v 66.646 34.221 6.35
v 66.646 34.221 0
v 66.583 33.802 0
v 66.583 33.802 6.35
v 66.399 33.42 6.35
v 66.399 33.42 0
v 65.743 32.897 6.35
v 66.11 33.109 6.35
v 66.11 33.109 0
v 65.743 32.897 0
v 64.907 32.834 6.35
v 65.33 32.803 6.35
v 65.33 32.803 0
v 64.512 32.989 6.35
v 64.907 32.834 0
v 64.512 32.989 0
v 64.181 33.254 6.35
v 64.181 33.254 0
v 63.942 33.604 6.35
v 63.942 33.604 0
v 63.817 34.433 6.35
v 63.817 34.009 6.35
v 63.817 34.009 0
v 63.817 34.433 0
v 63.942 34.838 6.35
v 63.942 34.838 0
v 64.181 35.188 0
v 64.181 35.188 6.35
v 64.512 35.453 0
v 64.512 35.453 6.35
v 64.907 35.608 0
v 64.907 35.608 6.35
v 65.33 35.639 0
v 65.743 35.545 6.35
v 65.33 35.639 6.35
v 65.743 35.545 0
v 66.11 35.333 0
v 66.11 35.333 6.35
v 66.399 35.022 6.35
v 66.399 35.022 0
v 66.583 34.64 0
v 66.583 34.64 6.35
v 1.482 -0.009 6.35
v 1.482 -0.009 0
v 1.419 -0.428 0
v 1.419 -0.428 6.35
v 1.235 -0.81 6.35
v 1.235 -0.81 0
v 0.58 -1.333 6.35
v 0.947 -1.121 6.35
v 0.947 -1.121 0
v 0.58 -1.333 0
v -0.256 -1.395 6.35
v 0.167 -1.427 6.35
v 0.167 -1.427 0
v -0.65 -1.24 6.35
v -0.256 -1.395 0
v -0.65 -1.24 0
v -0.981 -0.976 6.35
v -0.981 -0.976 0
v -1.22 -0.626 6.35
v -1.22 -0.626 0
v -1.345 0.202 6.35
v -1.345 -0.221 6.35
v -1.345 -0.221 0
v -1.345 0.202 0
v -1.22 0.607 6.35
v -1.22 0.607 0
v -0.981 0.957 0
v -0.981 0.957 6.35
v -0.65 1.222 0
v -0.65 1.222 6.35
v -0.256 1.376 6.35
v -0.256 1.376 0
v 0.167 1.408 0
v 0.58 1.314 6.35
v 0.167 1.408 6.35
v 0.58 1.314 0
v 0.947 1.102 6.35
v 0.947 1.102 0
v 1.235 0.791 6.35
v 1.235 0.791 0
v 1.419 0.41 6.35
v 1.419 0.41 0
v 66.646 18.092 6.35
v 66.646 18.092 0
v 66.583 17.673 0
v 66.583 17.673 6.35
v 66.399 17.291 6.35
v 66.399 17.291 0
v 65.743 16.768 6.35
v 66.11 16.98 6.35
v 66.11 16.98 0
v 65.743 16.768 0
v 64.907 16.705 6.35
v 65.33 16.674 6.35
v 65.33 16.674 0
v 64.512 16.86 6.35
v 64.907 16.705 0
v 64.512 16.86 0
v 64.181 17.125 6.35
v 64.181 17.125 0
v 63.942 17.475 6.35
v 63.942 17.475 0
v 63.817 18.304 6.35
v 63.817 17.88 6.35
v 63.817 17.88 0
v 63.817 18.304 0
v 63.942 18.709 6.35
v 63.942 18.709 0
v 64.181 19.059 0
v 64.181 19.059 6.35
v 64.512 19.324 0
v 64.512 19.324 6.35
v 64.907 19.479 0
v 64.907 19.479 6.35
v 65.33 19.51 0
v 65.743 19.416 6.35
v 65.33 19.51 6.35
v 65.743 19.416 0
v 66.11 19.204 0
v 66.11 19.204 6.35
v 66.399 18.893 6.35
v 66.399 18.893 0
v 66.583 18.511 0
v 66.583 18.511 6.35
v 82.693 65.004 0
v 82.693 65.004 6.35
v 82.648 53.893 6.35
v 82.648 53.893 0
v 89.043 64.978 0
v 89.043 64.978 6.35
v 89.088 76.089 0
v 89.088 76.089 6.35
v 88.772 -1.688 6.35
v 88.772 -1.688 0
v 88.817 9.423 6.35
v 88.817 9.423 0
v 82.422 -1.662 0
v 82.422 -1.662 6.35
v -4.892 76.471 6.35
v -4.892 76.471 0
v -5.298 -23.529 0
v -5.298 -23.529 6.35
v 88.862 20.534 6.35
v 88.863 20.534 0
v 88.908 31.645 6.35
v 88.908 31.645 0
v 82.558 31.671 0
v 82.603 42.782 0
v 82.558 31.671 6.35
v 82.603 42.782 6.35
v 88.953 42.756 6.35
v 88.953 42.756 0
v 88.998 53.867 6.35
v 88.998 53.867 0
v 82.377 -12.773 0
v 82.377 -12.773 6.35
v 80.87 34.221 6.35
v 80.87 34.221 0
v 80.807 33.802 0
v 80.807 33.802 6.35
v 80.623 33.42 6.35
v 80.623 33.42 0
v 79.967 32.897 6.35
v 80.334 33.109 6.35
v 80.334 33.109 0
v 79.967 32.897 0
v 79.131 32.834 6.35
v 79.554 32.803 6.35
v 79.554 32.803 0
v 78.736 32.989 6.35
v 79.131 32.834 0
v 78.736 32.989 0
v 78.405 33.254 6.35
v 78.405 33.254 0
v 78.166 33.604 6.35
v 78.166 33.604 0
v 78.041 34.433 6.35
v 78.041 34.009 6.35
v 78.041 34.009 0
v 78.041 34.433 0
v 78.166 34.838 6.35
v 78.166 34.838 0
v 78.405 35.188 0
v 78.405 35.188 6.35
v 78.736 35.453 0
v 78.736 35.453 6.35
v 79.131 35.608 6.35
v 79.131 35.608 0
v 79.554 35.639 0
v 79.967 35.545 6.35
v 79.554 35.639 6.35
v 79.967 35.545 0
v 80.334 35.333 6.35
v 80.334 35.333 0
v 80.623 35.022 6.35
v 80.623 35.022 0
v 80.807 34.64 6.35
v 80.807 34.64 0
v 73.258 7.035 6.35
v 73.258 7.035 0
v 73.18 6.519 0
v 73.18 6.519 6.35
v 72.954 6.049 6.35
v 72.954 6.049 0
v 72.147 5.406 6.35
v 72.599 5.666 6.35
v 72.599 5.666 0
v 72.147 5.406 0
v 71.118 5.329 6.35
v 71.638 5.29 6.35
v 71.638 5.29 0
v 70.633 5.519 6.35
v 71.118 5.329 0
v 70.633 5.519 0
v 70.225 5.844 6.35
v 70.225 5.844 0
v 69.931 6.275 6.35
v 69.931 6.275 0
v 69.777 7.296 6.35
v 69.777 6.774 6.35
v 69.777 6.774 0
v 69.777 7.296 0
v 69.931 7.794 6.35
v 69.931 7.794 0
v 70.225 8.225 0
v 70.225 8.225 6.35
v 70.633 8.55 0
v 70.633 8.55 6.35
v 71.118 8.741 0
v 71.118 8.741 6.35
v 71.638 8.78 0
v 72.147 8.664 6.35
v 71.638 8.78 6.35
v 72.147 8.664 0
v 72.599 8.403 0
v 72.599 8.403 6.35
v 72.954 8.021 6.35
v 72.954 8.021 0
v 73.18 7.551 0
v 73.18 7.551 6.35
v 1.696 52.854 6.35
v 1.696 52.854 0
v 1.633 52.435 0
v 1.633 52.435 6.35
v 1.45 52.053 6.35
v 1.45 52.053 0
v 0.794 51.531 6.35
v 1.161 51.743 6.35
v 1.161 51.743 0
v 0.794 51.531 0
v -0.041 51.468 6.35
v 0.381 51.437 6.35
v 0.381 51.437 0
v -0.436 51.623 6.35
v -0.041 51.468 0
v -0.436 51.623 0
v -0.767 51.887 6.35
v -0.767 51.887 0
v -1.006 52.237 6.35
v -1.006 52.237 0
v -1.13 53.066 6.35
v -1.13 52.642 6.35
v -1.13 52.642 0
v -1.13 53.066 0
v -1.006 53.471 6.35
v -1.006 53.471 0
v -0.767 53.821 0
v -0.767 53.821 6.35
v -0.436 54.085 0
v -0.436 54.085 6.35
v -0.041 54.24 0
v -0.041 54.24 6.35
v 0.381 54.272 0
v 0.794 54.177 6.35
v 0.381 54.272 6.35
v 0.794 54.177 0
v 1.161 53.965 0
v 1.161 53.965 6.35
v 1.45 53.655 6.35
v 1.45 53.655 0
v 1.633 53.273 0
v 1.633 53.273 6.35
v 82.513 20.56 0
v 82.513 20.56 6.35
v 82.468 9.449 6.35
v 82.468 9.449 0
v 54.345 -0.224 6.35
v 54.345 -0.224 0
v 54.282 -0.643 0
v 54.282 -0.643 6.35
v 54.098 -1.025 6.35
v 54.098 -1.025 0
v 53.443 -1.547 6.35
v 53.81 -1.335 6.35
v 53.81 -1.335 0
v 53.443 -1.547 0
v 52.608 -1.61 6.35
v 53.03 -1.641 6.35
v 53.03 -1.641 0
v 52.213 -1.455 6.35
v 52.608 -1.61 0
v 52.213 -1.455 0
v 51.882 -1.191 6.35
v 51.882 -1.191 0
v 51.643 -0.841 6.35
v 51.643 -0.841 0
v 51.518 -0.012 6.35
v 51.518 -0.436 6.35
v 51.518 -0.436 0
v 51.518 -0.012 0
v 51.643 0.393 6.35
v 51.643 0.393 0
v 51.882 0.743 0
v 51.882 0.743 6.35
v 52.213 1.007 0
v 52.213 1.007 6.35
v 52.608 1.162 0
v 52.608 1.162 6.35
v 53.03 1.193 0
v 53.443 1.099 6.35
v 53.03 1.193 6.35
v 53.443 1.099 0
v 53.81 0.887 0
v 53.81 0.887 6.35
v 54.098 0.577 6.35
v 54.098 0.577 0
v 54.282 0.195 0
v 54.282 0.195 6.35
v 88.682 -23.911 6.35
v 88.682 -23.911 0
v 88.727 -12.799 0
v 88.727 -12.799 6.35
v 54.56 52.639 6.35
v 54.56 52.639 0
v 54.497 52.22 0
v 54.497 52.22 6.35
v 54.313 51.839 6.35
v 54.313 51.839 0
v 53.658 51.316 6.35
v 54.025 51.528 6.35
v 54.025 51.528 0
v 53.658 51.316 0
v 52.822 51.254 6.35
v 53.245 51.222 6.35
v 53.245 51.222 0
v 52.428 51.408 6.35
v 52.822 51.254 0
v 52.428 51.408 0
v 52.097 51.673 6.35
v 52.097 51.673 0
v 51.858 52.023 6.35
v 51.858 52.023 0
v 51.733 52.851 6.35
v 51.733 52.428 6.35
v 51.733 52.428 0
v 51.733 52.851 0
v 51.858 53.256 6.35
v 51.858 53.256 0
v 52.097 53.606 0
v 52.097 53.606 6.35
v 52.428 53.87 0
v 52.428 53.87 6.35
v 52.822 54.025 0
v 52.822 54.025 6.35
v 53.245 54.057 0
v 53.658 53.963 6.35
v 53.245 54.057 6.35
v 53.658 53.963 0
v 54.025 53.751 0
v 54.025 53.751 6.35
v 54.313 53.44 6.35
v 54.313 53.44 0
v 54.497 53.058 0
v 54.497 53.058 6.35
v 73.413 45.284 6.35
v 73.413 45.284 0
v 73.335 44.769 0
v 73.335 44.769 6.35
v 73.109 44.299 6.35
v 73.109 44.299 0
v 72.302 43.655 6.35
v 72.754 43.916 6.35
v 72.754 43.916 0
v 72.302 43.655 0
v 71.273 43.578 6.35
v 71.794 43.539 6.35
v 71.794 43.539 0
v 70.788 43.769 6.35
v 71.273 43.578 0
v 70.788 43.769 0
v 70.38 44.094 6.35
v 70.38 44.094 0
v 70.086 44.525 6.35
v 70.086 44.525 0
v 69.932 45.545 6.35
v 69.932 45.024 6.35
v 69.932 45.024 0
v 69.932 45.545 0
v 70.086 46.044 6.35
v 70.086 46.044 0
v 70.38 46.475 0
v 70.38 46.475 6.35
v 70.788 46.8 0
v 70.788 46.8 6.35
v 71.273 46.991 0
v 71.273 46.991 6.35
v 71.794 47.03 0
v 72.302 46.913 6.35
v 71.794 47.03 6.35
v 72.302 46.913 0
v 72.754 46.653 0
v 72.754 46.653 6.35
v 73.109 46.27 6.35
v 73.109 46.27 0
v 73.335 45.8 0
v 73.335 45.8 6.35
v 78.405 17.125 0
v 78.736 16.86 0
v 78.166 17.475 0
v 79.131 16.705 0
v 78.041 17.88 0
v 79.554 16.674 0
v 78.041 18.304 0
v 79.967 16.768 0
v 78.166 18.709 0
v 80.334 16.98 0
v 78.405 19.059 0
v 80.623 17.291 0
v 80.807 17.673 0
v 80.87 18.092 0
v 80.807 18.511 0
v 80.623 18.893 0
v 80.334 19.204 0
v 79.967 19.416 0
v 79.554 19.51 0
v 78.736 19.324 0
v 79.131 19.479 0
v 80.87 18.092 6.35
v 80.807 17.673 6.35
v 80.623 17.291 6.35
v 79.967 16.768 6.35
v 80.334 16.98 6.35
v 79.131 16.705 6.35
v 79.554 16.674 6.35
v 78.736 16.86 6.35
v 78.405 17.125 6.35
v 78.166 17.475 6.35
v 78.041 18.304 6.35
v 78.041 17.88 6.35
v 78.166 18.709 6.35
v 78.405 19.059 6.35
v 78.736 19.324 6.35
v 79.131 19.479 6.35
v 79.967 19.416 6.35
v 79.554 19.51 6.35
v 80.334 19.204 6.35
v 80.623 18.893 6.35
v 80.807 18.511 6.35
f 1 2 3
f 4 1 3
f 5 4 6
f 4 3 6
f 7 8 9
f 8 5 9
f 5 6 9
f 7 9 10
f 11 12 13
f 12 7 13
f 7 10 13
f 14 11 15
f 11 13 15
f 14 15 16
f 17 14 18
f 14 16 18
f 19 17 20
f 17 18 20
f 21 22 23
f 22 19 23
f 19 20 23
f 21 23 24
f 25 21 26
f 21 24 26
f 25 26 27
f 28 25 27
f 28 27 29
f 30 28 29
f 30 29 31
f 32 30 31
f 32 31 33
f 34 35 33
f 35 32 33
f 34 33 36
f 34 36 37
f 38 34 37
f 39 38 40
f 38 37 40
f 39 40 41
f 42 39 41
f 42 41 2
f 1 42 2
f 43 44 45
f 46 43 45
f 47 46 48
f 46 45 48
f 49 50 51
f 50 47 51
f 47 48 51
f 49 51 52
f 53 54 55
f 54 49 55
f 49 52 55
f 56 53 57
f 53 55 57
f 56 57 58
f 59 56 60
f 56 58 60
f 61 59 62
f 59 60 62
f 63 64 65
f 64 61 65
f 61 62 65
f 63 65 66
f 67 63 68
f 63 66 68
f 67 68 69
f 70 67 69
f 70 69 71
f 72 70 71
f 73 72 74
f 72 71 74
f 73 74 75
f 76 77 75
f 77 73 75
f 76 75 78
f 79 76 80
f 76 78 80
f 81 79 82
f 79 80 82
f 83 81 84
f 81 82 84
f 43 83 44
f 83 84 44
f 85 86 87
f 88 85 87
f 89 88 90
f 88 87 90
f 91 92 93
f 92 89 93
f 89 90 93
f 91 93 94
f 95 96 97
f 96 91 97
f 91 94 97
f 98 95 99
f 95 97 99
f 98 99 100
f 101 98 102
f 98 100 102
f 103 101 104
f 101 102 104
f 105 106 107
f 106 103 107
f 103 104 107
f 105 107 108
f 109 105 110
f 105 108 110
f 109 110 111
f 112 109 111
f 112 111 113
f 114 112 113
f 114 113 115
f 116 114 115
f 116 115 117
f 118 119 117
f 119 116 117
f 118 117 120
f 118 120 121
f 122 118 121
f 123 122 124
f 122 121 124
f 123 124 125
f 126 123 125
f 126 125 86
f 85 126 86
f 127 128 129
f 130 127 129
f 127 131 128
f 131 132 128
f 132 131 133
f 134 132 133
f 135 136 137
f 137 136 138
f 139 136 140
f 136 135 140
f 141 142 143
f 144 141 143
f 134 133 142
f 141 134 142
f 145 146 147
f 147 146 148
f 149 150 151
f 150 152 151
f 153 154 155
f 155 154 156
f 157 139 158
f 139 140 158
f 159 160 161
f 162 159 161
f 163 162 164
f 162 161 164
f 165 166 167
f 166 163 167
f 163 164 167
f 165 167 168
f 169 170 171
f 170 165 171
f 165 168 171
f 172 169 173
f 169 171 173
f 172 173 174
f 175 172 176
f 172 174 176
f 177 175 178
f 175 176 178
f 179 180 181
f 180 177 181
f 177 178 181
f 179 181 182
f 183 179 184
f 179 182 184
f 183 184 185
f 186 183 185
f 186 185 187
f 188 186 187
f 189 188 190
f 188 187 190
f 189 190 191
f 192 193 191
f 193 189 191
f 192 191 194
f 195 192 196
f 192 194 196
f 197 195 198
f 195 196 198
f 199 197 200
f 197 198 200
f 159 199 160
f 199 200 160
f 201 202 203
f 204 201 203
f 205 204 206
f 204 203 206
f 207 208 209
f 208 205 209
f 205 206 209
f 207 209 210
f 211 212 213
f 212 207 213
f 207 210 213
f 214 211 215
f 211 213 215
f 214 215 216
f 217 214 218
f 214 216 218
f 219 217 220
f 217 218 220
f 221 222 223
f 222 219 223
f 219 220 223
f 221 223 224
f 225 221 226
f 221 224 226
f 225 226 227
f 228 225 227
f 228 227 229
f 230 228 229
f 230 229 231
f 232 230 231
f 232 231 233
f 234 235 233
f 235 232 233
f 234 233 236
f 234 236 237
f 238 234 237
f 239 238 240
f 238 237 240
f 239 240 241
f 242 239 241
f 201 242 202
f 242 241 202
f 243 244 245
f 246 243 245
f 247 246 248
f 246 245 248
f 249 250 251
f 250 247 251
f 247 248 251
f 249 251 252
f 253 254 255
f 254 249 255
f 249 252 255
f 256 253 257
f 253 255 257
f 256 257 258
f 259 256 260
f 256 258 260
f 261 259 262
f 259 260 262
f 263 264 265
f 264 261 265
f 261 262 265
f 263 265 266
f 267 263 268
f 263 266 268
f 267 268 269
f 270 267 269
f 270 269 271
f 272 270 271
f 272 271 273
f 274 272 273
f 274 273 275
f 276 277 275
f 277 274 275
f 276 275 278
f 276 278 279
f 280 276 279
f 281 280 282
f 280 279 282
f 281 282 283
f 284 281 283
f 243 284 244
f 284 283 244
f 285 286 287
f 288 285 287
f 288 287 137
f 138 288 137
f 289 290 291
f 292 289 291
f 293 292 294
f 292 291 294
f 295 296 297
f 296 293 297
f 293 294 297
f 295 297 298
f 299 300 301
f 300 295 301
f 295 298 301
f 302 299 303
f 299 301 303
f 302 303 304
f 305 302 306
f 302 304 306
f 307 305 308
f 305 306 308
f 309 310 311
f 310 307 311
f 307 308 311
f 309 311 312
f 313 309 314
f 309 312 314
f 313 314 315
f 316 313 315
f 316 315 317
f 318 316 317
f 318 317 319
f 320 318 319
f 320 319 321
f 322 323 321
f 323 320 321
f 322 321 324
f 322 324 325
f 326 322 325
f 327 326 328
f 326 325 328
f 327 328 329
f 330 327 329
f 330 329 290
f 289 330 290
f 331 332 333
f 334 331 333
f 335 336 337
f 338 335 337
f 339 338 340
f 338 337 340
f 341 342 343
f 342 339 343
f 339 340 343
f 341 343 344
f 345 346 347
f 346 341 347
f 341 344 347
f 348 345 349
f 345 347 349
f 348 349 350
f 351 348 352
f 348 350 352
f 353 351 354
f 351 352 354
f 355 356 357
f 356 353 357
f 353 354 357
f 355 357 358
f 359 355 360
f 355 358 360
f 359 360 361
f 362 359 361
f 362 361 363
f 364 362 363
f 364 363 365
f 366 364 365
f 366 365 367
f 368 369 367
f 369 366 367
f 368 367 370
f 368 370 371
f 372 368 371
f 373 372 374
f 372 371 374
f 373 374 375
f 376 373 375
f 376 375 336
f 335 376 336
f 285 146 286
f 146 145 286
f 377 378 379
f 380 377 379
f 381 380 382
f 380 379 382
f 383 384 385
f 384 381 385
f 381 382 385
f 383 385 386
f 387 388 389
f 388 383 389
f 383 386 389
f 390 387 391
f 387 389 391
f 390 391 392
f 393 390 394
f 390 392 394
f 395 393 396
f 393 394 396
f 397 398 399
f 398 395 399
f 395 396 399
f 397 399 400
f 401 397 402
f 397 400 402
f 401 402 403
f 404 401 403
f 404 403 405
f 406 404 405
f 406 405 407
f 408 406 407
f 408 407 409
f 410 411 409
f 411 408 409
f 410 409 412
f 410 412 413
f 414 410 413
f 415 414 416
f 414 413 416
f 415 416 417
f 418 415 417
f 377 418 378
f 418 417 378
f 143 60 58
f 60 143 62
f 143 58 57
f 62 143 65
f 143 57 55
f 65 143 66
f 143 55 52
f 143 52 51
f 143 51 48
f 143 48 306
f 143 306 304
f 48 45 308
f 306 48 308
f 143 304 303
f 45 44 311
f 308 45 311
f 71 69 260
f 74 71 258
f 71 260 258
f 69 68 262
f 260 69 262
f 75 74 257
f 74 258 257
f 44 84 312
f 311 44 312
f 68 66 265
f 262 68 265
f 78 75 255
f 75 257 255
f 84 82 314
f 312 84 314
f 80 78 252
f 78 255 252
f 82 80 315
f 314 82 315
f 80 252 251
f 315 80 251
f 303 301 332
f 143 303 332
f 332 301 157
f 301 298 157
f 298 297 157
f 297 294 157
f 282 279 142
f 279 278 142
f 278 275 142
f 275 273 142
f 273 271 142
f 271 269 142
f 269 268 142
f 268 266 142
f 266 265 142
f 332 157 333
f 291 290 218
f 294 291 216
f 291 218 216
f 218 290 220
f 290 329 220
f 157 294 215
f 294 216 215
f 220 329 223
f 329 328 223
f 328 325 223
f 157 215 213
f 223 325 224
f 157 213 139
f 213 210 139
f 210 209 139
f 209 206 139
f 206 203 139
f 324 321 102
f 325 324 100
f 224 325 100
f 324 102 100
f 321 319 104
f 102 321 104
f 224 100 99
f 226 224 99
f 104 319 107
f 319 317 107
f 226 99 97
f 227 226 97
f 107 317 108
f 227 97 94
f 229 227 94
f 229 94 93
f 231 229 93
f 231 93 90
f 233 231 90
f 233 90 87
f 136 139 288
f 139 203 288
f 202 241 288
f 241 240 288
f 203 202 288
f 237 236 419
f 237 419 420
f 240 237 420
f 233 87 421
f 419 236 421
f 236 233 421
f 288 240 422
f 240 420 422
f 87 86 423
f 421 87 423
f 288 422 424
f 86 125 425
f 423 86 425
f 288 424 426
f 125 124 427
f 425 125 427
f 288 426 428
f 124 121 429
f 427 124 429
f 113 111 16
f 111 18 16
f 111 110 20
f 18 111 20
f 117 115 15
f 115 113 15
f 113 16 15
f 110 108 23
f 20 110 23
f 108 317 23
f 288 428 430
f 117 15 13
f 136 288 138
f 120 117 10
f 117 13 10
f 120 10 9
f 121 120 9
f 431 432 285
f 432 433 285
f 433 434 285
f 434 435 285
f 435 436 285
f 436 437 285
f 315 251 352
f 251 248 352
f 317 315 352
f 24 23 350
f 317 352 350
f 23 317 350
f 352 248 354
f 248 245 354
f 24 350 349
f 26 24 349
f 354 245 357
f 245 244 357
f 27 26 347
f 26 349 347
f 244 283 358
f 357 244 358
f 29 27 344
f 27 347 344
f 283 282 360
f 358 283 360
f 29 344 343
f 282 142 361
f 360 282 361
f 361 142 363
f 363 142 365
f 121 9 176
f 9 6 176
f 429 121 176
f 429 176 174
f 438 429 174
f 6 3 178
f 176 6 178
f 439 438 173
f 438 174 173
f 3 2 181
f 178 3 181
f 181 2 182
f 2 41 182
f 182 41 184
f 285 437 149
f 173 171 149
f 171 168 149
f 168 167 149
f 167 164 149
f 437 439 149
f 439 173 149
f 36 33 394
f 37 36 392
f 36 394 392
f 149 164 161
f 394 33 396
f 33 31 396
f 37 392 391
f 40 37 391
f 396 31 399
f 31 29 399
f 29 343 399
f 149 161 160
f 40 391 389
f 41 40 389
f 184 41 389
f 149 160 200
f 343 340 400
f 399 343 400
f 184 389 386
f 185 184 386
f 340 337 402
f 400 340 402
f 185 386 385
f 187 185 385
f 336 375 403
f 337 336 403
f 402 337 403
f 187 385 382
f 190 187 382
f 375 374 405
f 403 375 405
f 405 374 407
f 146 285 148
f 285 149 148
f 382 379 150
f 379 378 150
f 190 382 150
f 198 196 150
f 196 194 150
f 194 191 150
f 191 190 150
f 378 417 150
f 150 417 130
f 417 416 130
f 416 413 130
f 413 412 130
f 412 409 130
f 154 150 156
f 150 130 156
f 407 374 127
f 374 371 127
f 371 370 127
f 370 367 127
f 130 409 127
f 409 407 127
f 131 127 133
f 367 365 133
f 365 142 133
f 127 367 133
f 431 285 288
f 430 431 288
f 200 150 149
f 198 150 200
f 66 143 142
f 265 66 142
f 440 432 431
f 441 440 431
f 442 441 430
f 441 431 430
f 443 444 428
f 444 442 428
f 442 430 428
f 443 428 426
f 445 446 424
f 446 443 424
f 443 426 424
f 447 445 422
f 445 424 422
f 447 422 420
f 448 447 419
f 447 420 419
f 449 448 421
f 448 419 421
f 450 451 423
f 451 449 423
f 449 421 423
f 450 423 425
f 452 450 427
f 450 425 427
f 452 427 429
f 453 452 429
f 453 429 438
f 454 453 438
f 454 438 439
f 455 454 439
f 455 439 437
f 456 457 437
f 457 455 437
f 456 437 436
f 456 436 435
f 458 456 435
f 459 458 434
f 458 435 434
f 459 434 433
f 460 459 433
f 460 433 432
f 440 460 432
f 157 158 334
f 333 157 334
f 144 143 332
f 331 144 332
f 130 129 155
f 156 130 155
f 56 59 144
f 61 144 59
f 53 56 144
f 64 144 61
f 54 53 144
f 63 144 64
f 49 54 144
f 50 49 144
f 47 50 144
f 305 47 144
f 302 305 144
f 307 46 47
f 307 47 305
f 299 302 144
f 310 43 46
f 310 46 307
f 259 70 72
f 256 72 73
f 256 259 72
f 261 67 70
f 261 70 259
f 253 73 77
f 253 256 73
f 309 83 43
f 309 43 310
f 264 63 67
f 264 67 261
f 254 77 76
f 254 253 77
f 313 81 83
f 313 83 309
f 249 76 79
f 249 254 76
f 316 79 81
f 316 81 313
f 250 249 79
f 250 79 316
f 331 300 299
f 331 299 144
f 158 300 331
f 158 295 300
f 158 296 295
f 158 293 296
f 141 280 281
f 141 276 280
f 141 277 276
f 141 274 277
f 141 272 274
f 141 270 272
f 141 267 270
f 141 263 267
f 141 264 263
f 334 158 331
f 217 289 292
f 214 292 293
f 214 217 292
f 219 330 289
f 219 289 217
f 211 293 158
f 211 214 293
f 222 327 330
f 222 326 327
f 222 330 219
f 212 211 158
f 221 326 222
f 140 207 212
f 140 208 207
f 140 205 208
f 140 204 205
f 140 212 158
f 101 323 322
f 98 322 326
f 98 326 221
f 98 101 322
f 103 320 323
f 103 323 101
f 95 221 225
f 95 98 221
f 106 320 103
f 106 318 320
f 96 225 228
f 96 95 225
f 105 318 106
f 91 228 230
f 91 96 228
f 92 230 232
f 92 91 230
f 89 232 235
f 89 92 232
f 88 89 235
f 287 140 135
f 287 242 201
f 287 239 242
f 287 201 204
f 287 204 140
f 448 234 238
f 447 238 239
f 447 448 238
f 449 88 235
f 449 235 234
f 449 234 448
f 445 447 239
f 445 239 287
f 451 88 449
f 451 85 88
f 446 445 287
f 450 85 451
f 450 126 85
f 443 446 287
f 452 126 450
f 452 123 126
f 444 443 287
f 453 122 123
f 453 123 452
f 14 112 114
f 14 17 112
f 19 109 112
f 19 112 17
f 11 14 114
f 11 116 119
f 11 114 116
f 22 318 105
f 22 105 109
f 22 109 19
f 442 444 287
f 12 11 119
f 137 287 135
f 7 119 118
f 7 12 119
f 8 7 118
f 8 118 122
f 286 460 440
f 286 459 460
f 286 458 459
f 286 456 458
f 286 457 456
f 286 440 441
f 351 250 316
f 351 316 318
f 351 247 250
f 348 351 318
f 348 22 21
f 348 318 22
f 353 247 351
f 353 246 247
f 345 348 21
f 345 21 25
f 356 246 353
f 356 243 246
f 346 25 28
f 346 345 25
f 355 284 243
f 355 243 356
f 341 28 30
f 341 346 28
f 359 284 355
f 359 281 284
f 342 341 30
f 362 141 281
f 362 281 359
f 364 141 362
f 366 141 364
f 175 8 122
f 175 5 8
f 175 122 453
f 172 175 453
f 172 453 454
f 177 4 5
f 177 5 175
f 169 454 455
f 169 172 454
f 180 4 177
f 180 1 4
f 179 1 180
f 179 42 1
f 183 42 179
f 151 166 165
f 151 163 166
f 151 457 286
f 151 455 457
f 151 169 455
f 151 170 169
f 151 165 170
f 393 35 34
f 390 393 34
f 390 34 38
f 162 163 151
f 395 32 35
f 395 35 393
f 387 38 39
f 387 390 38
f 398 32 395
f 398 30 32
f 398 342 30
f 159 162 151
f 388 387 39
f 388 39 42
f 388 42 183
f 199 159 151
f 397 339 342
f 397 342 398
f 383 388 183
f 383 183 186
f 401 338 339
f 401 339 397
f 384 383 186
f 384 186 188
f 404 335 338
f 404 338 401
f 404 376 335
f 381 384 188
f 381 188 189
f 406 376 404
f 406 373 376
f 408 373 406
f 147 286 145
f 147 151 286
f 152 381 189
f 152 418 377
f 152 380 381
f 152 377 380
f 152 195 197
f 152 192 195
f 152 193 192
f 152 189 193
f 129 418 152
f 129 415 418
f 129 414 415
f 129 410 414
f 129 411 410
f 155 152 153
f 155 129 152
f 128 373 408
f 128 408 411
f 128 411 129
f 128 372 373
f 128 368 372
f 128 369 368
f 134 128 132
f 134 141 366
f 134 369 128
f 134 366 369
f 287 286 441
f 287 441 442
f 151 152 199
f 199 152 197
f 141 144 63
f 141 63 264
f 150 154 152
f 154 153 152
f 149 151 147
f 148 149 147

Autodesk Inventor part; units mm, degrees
ref_plane "YZ Plane" through (0, 0, 0) normal (1, 0, 0) x (0, 1, 0)
ref_plane "XZ Plane" through (0, 0, 0) normal (0, 1, 0) x (-1, 0, 0)
ref_plane "XY Plane" through (0, 0, 0) normal (0, 0, 1) x (1, 0, 0)
sketch "Sketch1" plane through (0, 0, 0) normal (0, 0, 1) x (1, 0, 0)
  circle A0 centre (0.2751, 52.8541) radius 1.4214
  circle A1 centre (53.1386, 52.6394) radius 1.4214
  circle A2 centre (52.924, -0.224) radius 1.4214
  circle A3 centre (0.0605, -0.0094) radius 1.4214
  circle A4 centre (0.2751, 52.8541) radius 1.4214
  circle A5 centre (0.0605, -0.0094) radius 1.4214
  circle A6 centre (52.924, -0.224) radius 1.4214
  circle A7 centre (53.1386, 52.6394) radius 1.4214
  line L0 (-5.2979, -23.5291) -> (88.6821, -23.9107)
  line L1 (88.6821, -23.9107) -> (89.0881, 76.0893)
  line L2 (89.0881, 76.0893) -> (-4.8919, 76.4709)
  line L3 (-4.8919, 76.4709) -> (-5.2979, -23.5291)
  line L4 (-5.2979, -23.5291) -> (2.9514, -23.54) construction
  circle A8 centre (26.5572, 26.3424) radius 11 construction
  circle A9 centre (41.9941, 10.7796) radius 1.5 construction
  circle A10 centre (10.9944, 10.9055) radius 1.5 construction
  circle A11 centre (11.1202, 41.9052) radius 1.5 construction
  circle A12 centre (42.12, 41.7793) radius 1.5 construction
  circle A13 centre (0.2148, 52.8996) radius 1.4224 construction
  circle A14 centre (0, 0) radius 1.4224 construction
  circle A15 centre (52.8996, -0.2148) radius 1.4224 construction
  circle A16 centre (53.1143, 52.6848) radius 1.4224 construction
  line L5 (-5.3215, -5.2784) -> (58.178, -5.5363) construction
  line L6 (58.178, -5.5363) -> (58.4358, 57.9632) construction
  line L7 (58.4358, 57.9632) -> (-5.0637, 58.221) construction
  line L8 (-5.0637, 58.221) -> (-5.3215, -5.2784) construction
  line L9 (88.8851, 26.0893) -> (-5.1926, 26.4713) construction
  line L10 (63.369, -2.4573) -> (63.4464, 16.5925) construction
  line L11 (63.5243, 35.7924) -> (63.6017, 54.8422) construction
  line L12 (63.5243, 35.7924) -> (82.5742, 35.715) construction
  line L13 (63.369, -2.4573) -> (82.4189, -2.5346) construction
  circle A17 centre (71.5076, 7.0347) radius 1.75
  circle A18 centre (71.6629, 45.2844) radius 1.75
  circle A19 centre (71.6629, 45.2844) radius 1.75 construction
  circle A20 centre (71.5076, 7.0347) radius 1.75 construction
  circle A21 centre (72.3353, 26.1565) radius 2.5 construction
  line L14 (65.2233, 18.092) -> (79.4473, 18.092) construction
  line L15 (79.4473, 18.092) -> (79.4473, 34.221) construction
  line L16 (79.4473, 34.221) -> (65.2233, 34.221) construction
  line L17 (65.2233, 34.221) -> (65.2233, 18.092) construction
  line L18 (65.2233, 18.092) -> (79.4473, 34.221) construction
  line L19 (79.4473, 18.092) -> (65.2233, 34.221) construction
  circle A22 centre (79.4473, 18.092) radius 1.4224
  circle A23 centre (65.2233, 18.092) radius 1.4224
  circle A24 centre (79.4473, 34.221) radius 1.4224
  circle A25 centre (65.2233, 34.221) radius 1.4224
  circle A26 centre (79.4473, 18.092) radius 2.6035 construction
  circle A27 centre (65.2233, 18.092) radius 2.6035 construction
  circle A28 centre (79.4473, 34.221) radius 2.6035 construction
  circle A29 centre (65.2233, 34.221) radius 2.6035 construction
  point P0 (0.0605, -0.0094)
  point P1 (88.9156, 66.1637)
  dimension "d7" = 100
  dimension "d8" = 93.98
  dimension "d38" = 3.5
  dimension "d39" = 3.5
  dimension "d40" = 14.224
  dimension "d41" = 16.129
  dimension "d42" = 2.8448
  dimension "d43" = 2.8448
  dimension "d44" = 2.8448
  dimension "d45" = 2.8448
  dimension "d46" = 5.207
  dimension "d47" = 5.207
  dimension "d48" = 5.207
  dimension "d49" = 5.207
extrude "Extrusion1" add sketch "Sketch1" along normal blind 6.35
sketch "Sketch2" plane through (0, 0, 6.35) normal (0, 0, 1) x (1, 0, 0)
  circle A0 centre (0.0605, -0.0094) radius 1.4214 construction
  circle A1 centre (52.924, -0.224) radius 1.4214 construction
  circle A2 centre (53.1386, 52.6394) radius 1.4214 construction
  circle A3 centre (0.2751, 52.8541) radius 1.4214 construction
  line L0 (-5.2979, -23.5291) -> (88.6821, -23.9107) construction
  line L1 (89.0881, 76.0893) -> (-4.8919, 76.4709) construction
  line L2 (-4.8919, 76.4709) -> (-5.2979, -23.5291) construction
  line L3 (89.0881, 76.0893) -> (89.043, 64.9782)
  line L4 (89.043, 64.9782) -> (82.693, 65.004)
  line L5 (82.693, 65.004) -> (82.6479, 53.8929)
  line L6 (82.6479, 53.8929) -> (88.9978, 53.8671)
  line L7 (89.043, 64.9782) -> (88.9978, 53.8671)
  line L8 (88.9979, 53.8673) -> (88.9527, 42.7562)
  line L9 (88.9527, 42.7562) -> (82.6028, 42.782)
  line L10 (82.6028, 42.782) -> (82.5577, 31.6709)
  line L11 (82.5577, 31.6709) -> (88.9076, 31.6451)
  line L12 (88.9527, 42.7562) -> (88.9076, 31.6451)
  line L13 (88.9076, 31.6453) -> (88.8625, 20.5341)
  line L14 (88.8625, 20.5341) -> (82.5126, 20.5599)
  line L15 (82.5126, 20.5599) -> (82.4675, 9.4488)
  line L16 (82.4675, 9.4488) -> (88.8174, 9.423)
  line L17 (88.8625, 20.5341) -> (88.8174, 9.423)
  line L18 (88.8174, 9.4232) -> (88.7723, -1.6879)
  line L19 (88.7723, -1.6879) -> (82.4223, -1.6621)
  line L20 (82.4223, -1.6621) -> (82.3772, -12.7732)
  line L21 (82.3772, -12.7732) -> (88.7272, -12.799)
  line L22 (88.7723, -1.6879) -> (88.7272, -12.799)
  point P0 (0, 0)
  dimension "d12" = 6.35
  dimension "d14" = 11.1111
  dimension "d31" = 22.2222
extrude "Extrusion2" cut sketch "Sketch2" against normal blind 25.4
equation "\"d14\" = d11"
equation "\"d11\" = 11.111111"
